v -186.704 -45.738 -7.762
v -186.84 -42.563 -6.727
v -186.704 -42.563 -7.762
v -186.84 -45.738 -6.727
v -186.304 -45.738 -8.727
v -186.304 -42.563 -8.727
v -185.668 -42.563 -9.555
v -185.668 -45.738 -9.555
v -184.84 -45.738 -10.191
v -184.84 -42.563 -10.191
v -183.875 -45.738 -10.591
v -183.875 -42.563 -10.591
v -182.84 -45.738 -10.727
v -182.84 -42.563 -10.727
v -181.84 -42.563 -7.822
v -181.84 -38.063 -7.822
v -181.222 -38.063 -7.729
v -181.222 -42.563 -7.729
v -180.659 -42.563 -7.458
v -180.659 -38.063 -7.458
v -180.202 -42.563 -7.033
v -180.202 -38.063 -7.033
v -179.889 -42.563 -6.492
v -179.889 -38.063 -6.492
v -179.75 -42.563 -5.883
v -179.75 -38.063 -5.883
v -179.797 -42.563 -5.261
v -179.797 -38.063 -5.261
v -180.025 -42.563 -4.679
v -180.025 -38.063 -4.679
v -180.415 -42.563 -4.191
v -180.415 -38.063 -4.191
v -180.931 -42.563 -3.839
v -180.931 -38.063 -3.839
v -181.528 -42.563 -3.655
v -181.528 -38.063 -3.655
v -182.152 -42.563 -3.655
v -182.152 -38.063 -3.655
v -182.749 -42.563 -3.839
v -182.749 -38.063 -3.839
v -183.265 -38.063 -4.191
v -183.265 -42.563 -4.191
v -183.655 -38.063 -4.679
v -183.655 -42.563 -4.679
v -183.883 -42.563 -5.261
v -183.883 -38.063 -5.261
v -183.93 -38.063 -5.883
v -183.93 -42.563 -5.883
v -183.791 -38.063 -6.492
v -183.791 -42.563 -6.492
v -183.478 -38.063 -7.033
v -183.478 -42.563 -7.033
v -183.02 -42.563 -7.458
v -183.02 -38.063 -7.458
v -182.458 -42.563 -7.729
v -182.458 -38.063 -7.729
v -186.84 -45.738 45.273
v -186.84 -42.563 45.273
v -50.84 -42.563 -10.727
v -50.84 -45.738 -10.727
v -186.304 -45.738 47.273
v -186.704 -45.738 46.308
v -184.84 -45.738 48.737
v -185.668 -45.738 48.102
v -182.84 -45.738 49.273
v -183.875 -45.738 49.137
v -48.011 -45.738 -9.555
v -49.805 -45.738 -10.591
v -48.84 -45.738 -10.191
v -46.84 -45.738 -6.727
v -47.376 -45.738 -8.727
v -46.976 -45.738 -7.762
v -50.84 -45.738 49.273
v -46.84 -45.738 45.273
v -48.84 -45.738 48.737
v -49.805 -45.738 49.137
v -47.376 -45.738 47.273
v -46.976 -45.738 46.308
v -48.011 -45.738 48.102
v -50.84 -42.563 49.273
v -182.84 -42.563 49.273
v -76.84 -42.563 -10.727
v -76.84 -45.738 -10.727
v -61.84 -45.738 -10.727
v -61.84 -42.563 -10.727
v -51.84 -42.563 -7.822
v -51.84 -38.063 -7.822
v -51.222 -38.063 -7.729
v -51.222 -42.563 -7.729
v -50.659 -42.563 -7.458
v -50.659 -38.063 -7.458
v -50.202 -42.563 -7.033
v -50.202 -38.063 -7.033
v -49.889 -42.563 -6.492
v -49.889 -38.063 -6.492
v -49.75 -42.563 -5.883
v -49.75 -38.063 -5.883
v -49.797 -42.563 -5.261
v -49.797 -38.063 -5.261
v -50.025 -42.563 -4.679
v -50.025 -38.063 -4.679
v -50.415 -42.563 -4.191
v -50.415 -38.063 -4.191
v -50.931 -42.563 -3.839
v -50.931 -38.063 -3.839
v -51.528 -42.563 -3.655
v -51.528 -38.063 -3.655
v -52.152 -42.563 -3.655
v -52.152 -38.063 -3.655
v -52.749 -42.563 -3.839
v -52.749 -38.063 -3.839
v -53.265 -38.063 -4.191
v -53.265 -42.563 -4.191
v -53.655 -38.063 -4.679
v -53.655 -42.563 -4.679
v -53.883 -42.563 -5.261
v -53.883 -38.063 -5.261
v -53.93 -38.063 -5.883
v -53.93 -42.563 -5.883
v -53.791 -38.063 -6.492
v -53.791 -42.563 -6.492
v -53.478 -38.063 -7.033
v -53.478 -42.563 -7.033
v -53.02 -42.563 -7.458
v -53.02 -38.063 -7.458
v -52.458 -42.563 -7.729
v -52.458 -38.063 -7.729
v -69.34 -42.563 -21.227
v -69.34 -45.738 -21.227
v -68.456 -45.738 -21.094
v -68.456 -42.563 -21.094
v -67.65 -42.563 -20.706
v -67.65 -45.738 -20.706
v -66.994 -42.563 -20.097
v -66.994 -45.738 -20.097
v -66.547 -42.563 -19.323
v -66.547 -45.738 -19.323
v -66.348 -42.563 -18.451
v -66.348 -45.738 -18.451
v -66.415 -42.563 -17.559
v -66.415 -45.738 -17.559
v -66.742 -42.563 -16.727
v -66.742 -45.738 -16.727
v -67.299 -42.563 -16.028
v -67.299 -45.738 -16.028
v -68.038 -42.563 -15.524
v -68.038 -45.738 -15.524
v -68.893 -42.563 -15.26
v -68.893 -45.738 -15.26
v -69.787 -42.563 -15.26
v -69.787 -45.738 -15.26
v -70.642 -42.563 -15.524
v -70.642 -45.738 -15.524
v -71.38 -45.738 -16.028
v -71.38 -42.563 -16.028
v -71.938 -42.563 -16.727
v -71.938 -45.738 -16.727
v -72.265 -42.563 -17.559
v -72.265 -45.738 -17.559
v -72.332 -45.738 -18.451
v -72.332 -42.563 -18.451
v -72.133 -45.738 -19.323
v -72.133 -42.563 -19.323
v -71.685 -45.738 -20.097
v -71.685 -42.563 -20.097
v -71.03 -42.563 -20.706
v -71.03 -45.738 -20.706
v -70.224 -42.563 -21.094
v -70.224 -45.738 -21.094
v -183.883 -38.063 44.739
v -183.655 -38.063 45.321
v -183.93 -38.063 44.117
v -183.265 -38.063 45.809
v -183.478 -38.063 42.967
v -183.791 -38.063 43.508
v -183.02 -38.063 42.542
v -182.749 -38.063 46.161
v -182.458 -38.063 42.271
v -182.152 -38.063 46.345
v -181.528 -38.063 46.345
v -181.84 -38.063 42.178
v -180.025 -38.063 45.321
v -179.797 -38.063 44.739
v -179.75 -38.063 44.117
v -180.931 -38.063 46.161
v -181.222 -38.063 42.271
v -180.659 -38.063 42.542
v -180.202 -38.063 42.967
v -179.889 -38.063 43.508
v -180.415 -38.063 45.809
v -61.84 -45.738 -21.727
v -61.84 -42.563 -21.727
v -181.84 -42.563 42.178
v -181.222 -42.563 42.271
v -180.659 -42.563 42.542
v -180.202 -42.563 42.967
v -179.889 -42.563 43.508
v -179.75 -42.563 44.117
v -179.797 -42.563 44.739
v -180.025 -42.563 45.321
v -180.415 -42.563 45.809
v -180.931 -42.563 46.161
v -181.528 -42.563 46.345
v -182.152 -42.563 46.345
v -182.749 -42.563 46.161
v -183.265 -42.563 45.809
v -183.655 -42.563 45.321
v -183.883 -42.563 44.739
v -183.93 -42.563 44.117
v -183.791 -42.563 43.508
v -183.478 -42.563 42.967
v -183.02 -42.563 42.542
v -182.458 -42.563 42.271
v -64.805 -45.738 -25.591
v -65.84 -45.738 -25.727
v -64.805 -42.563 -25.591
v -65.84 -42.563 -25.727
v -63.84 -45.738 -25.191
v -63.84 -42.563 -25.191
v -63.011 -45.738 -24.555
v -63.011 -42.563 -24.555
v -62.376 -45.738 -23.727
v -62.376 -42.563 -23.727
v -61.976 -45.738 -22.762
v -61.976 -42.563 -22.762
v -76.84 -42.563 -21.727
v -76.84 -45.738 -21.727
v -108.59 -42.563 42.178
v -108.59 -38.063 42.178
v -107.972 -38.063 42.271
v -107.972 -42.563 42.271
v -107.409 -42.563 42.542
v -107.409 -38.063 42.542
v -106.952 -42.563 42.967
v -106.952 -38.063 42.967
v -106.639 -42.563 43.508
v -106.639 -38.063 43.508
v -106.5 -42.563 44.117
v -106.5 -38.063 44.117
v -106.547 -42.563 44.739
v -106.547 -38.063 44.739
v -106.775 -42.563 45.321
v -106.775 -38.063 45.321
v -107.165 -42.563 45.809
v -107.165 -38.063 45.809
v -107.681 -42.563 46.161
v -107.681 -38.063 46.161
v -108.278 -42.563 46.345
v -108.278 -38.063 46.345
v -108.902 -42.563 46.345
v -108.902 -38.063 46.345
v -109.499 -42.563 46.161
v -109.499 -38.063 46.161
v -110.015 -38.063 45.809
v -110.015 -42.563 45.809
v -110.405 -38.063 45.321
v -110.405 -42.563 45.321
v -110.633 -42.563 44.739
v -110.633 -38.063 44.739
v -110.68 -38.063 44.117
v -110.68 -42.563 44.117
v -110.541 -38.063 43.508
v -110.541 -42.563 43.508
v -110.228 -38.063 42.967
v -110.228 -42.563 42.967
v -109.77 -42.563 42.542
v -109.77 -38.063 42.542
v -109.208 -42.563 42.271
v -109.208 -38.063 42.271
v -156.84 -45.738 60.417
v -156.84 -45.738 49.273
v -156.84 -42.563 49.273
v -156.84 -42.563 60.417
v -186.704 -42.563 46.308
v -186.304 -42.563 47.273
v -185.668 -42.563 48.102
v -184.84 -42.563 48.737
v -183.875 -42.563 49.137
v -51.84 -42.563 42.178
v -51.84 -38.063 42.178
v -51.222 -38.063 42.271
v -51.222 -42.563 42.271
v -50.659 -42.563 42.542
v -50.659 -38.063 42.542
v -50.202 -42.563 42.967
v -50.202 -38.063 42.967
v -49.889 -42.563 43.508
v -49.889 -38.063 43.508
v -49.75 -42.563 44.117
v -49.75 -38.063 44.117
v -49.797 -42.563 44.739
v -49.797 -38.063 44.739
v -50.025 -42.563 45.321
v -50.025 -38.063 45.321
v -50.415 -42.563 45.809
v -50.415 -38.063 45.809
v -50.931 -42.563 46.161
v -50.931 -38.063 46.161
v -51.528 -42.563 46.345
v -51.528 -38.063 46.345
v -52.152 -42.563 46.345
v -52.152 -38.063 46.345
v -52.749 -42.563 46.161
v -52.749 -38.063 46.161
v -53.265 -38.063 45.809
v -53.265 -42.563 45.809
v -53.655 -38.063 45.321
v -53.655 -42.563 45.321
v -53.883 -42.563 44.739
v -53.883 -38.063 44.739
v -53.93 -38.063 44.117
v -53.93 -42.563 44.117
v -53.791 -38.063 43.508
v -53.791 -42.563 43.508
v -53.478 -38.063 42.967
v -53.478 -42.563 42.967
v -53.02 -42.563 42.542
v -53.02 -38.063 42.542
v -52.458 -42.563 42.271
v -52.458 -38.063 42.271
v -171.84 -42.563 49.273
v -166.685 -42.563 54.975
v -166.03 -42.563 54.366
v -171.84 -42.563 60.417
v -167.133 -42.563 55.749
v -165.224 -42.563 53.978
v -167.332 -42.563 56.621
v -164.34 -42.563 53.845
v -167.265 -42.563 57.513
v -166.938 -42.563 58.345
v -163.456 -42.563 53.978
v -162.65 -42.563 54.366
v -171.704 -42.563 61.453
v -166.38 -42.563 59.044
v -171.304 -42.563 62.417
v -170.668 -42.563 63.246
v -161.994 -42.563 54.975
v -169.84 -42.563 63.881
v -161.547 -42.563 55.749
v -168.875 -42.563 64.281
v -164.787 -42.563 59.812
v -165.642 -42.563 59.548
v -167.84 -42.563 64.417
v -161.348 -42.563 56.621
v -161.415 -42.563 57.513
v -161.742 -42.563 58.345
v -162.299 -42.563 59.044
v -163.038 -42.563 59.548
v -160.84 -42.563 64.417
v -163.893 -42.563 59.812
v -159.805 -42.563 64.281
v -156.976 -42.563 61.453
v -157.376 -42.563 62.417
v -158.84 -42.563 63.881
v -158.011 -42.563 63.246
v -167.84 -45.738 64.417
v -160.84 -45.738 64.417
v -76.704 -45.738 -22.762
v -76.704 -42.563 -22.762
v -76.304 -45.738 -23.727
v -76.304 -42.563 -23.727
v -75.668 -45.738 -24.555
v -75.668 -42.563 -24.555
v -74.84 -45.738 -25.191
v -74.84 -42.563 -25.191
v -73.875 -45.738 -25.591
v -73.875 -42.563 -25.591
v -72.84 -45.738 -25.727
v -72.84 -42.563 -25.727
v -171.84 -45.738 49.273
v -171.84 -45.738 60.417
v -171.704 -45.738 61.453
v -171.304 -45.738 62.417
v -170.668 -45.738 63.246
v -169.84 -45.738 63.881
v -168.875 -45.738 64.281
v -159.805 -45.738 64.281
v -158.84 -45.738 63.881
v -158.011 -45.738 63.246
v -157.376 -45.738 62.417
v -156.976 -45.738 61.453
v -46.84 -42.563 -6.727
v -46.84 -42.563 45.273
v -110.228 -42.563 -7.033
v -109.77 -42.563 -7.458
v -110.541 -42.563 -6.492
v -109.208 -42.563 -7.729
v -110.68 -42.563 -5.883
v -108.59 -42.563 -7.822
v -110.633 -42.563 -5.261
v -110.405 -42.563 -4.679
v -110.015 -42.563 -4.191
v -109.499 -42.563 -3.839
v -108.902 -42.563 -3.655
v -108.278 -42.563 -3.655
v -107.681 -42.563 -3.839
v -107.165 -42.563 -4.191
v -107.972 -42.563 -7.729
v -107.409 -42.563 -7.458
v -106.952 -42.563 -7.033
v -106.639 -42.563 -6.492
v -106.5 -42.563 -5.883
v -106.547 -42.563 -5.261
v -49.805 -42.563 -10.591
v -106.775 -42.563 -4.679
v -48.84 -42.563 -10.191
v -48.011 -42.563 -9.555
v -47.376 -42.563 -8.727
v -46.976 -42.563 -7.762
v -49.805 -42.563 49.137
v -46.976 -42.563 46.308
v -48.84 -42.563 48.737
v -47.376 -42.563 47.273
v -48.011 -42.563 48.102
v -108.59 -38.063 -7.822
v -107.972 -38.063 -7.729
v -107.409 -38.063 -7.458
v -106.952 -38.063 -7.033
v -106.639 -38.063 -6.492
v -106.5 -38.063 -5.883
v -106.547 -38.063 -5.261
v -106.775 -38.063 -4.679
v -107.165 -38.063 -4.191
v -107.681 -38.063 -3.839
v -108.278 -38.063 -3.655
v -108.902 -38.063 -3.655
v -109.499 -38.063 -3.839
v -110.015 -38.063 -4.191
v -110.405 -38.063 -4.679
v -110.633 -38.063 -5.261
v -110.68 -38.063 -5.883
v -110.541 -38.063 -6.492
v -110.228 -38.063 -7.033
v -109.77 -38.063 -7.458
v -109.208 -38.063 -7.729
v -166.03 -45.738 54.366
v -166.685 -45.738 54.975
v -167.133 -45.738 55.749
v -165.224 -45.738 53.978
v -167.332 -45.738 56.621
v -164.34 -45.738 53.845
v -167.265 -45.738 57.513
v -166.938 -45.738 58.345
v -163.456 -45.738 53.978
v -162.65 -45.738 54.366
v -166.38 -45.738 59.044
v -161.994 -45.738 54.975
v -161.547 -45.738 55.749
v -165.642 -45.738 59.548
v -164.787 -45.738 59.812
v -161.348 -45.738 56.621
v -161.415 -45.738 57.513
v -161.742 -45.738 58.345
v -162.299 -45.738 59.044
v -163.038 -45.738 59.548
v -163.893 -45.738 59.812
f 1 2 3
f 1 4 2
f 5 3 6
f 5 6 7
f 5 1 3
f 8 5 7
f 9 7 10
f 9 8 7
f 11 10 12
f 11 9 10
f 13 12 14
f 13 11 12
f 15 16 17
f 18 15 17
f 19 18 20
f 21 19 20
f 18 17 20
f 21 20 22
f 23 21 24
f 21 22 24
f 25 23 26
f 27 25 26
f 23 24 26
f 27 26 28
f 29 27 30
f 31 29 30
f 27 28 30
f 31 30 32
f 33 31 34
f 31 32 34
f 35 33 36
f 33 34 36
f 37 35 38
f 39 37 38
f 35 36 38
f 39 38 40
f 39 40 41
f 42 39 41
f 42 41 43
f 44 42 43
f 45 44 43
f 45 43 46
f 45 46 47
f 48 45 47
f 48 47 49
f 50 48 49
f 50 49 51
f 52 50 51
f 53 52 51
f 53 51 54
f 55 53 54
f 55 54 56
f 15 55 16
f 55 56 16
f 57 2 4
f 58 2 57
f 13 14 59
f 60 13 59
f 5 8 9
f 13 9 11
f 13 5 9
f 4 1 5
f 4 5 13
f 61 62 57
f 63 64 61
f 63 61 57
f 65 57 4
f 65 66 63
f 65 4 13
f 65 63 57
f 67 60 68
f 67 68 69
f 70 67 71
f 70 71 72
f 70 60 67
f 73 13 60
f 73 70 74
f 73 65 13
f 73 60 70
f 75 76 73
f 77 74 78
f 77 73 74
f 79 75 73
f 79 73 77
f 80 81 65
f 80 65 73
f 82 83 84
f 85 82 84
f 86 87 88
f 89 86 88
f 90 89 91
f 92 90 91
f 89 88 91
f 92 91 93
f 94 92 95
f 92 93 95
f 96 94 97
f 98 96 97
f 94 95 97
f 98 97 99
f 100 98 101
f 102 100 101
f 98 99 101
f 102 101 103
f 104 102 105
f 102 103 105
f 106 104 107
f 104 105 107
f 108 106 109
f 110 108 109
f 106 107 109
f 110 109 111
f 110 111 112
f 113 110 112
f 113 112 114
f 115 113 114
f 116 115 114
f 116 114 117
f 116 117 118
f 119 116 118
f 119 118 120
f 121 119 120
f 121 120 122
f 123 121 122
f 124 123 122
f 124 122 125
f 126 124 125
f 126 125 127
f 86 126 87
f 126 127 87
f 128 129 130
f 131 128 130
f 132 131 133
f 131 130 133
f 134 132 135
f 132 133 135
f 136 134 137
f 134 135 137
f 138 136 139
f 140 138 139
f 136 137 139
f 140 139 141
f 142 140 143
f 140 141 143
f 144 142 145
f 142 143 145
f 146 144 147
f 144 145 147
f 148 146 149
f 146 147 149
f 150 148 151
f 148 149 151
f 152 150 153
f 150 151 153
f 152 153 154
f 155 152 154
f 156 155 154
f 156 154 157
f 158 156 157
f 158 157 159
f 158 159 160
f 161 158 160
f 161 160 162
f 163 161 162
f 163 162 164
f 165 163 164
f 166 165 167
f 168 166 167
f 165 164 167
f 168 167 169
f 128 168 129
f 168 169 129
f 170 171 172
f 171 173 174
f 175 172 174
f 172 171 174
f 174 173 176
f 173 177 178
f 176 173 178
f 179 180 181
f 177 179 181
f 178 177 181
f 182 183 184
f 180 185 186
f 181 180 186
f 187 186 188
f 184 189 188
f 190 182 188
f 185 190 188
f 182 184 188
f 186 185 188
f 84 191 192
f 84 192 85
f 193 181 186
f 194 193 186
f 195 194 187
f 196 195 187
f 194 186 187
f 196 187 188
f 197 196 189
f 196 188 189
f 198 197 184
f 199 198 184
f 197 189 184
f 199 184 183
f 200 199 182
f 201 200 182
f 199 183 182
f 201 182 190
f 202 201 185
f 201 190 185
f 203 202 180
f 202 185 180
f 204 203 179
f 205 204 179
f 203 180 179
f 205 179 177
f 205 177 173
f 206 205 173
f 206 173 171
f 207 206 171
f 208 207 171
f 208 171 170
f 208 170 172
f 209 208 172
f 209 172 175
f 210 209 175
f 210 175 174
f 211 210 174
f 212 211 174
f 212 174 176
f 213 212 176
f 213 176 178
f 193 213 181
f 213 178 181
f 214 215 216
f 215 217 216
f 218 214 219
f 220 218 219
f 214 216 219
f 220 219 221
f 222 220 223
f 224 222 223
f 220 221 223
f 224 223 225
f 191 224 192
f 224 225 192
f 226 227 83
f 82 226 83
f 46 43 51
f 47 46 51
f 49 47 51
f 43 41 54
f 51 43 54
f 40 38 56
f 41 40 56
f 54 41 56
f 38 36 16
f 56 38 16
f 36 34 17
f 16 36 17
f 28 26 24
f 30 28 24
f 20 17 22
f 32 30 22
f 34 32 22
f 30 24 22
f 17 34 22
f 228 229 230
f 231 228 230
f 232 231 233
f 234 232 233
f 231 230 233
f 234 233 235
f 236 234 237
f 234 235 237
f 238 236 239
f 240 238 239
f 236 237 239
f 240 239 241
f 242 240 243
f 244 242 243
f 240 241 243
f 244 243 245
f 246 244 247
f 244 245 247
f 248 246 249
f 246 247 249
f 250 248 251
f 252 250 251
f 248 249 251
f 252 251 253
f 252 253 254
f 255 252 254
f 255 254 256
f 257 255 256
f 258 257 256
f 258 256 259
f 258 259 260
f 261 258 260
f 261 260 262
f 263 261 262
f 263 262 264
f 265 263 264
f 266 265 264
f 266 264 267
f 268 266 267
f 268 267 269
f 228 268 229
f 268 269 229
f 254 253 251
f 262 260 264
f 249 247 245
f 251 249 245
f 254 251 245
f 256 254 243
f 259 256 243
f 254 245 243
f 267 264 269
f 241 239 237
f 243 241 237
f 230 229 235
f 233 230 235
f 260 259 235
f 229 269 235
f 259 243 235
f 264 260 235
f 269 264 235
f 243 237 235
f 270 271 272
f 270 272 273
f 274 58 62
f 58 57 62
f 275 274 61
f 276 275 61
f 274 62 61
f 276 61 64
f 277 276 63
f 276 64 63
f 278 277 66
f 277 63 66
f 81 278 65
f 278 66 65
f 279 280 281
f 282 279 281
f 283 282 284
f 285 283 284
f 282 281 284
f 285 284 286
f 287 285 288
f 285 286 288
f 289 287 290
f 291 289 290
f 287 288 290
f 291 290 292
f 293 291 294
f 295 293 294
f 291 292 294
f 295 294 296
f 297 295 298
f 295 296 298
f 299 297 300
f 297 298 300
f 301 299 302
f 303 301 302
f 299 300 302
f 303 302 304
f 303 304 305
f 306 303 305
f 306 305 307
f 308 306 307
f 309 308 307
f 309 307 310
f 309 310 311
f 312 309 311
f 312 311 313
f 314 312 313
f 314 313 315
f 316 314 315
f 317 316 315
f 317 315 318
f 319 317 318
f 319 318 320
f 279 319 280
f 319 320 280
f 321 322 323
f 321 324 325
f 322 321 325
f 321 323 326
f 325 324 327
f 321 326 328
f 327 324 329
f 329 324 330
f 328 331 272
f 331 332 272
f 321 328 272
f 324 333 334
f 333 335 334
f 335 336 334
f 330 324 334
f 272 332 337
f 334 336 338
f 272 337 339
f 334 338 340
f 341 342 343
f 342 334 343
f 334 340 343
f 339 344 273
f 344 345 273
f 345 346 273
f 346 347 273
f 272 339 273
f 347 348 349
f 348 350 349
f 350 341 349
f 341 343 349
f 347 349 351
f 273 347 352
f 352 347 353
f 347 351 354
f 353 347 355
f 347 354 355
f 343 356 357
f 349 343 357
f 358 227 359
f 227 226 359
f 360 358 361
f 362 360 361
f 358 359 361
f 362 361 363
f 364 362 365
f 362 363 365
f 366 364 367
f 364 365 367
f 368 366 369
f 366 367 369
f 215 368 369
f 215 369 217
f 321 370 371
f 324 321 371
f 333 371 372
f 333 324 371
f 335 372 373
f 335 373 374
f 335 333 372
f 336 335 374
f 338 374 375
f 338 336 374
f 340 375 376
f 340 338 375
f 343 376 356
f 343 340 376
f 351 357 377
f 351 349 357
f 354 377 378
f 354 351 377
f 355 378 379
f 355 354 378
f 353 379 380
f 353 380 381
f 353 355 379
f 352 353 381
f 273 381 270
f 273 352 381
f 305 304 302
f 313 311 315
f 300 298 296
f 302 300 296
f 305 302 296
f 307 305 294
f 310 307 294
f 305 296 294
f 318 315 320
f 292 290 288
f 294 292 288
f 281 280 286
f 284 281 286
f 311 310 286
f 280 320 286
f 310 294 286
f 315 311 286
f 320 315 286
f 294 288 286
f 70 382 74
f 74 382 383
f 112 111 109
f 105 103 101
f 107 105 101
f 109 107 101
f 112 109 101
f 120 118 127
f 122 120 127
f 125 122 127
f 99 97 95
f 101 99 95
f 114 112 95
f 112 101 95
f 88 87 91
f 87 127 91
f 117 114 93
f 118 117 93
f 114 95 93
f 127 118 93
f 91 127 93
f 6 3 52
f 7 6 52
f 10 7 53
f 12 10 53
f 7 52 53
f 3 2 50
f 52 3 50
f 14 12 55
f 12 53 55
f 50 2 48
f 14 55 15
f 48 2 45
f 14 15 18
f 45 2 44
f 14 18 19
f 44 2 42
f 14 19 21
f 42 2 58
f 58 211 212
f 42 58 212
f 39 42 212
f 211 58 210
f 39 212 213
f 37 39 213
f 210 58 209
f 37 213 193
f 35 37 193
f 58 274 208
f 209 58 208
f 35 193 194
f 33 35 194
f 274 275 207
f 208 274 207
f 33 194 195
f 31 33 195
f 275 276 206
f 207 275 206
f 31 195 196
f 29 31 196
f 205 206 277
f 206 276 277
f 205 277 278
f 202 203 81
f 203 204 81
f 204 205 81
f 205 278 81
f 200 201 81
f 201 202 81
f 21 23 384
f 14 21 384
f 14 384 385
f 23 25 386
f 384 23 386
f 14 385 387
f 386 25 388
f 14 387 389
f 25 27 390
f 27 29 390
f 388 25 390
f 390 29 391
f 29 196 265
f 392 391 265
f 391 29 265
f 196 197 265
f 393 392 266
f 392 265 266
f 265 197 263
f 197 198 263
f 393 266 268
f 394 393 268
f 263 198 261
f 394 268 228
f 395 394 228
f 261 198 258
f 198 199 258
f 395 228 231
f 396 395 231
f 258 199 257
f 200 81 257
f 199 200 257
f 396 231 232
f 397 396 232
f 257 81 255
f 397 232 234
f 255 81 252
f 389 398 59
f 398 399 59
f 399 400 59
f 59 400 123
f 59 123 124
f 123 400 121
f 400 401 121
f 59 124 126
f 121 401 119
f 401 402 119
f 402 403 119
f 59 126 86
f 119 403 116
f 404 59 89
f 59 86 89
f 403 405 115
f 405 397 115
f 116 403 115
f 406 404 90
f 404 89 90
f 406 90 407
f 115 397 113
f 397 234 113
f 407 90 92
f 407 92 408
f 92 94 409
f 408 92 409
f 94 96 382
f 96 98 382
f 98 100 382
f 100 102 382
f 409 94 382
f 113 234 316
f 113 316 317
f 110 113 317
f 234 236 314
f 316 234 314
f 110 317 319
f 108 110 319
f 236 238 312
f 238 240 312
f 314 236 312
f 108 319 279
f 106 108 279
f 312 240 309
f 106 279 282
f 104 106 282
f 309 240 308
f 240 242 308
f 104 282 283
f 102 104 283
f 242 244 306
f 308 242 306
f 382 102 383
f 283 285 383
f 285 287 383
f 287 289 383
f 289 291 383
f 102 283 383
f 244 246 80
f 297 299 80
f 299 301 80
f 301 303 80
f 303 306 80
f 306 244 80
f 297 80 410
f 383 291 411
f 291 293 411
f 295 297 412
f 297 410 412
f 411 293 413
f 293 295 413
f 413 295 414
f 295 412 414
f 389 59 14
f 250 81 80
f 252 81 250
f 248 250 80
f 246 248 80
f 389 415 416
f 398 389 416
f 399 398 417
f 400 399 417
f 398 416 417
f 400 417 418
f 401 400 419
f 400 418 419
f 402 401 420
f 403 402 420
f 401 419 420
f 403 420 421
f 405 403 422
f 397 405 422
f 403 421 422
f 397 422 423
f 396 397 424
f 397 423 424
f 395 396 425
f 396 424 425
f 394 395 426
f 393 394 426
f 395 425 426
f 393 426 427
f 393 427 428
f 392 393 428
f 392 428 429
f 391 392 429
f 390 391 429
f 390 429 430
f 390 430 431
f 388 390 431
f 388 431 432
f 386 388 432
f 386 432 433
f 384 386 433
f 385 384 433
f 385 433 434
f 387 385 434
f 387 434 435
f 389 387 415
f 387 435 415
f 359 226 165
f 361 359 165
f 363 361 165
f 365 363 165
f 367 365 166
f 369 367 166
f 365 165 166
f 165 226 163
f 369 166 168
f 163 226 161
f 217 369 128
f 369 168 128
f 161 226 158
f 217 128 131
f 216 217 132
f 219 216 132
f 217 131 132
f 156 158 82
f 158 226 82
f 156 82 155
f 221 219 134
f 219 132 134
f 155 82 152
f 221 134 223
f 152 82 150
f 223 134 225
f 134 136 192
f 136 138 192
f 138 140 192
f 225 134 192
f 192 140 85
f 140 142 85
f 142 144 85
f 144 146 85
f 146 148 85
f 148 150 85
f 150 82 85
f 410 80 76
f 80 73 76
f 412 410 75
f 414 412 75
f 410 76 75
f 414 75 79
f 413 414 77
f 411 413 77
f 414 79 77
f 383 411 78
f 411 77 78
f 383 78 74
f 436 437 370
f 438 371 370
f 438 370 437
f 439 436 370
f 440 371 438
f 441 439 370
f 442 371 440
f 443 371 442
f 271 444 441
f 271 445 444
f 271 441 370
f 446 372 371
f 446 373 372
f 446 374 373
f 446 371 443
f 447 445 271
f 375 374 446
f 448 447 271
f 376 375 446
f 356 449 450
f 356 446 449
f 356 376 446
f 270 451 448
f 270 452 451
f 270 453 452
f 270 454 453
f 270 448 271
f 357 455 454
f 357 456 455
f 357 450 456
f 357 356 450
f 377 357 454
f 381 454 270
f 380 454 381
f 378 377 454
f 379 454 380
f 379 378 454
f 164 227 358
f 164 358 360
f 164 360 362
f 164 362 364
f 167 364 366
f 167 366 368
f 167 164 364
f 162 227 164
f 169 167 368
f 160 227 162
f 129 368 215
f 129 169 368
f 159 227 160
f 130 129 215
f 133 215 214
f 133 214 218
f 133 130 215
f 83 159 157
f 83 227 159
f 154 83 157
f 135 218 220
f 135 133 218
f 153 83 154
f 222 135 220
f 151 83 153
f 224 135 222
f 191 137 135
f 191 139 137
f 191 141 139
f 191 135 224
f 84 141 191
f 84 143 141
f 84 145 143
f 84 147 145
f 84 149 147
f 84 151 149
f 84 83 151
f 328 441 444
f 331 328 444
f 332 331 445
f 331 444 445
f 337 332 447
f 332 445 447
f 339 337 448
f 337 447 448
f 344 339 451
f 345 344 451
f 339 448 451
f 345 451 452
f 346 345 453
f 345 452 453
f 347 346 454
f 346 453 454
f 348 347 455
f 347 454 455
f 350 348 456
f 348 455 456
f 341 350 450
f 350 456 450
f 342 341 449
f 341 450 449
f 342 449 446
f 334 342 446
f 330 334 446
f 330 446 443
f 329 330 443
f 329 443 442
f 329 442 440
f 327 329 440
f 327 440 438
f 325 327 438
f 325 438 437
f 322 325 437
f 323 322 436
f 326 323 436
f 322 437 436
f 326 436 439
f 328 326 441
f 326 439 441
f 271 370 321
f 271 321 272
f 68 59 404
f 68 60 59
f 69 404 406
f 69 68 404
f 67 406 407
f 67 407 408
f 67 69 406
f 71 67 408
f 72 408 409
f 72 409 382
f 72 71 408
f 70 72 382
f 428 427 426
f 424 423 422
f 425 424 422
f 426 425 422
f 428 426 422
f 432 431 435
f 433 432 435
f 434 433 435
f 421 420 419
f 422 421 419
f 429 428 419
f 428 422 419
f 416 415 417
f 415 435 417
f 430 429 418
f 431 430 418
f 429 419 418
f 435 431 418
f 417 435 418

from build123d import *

# Parameters (mm, degrees)
SKETCH1_R             = 2.0955
BOSS_EXTRUDE1_DEPTH   = 4.5
BOSS_EXTRUDE1_2_DEPTH = 4.5
BOSS_EXTRUDE1_3_DEPTH = 4.5
BOSS_EXTRUDE1_4_DEPTH = 4.5
BOSS_EXTRUDE1_5_DEPTH = 4.5
BOSS_EXTRUDE1_6_DEPTH = 4.5
SKETCH2_W             = 140
SKETCH2_H             = 60
BOSS_EXTRUDE2_DEPTH   = 3.175
FILLET1_R             = 4
SKETCH3_W             = 15
SKETCH3_H             = 15.144108324
SKETCH3_R             = 3
BOSS_EXTRUDE3_DEPTH   = 3.175
SKETCH3_H_2           = 15
BOSS_EXTRUDE3_2_DEPTH = 3.175
FILLET2_R             = 4
FILLET3_R             = 4


with BuildPart() as part:
    # Sketch1 → Boss-Extrude1 (new body)
    with BuildSketch(Plane.XZ.offset(38.063324544)):
        with Locations(Location((-181.839905385, -5.726884341, 0), (0, 0, 270))):
            Circle(SKETCH1_R)
    extrude(amount=BOSS_EXTRUDE1_DEPTH)



with BuildPart() as body_2:
    # Sketch1 → Boss-Extrude1 2 (new body)
    with BuildSketch(Plane.XZ.offset(38.063324544)):
        with Locations(Location((-108.589905385, -5.726884341, 0), (0, 0, 270))):
            Circle(SKETCH1_R)
    extrude(amount=BOSS_EXTRUDE1_2_DEPTH)


with BuildPart() as body_3:
    # Sketch1 → Boss-Extrude1 3 (new body)
    with BuildSketch(Plane.XZ.offset(38.063324544)):
        with Locations(Location((-51.839905385, -5.726884341, 0), (0, 0, 270))):
            Circle(SKETCH1_R)
    extrude(amount=BOSS_EXTRUDE1_3_DEPTH)


with BuildPart() as body_4:
    # Sketch1 → Boss-Extrude1 4 (new body)
    with BuildSketch(Plane.XZ.offset(38.063324544)):
        with Locations(Location((-51.839905385, 44.273115659, 0), (0, 0, 270))):
            Circle(SKETCH1_R)
    extrude(amount=BOSS_EXTRUDE1_4_DEPTH)


with BuildPart() as body_5:
    # Sketch1 → Boss-Extrude1 5 (new body)
    with BuildSketch(Plane.XZ.offset(38.063324544)):
        with Locations(Location((-108.589905385, 44.273115659, 0), (0, 0, 270))):
            Circle(SKETCH1_R)
    extrude(amount=BOSS_EXTRUDE1_5_DEPTH)


with BuildPart() as body_6:
    # Sketch1 → Boss-Extrude1 6 (new body)
    with BuildSketch(Plane.XZ.offset(38.063324544)):
        with Locations(Location((-181.839905385, 44.273115659, 0), (0, 0, 270))):
            Circle(SKETCH1_R)
    extrude(amount=BOSS_EXTRUDE1_6_DEPTH)


with BuildPart() as part_1:
    add(part.part)

    add(body_2.part)  # Boss-Extrude2 merges body 2

    add(body_3.part)  # Boss-Extrude2 merges body 3

    add(body_4.part)  # Boss-Extrude2 merges body 4

    add(body_5.part)  # Boss-Extrude2 merges body 5

    add(body_6.part)  # Boss-Extrude2 merges body 6
    # Sketch2 → Boss-Extrude2 (add)
    with BuildSketch(Plane.XZ.offset(42.563324544)):
        with Locations((-116.839905385, 19.273115659)):
            Rectangle(SKETCH2_W, SKETCH2_H)
    extrude(amount=BOSS_EXTRUDE2_DEPTH)

    # Fillet1
    fillet1_edges = [part_1.edges().sort_by_distance(p)[0] for p in [
        (-46.839905385, -44.150824544, -10.726884341),
        (-46.839905385, -44.150824544, 49.273115659),
        (-186.839905385, -44.150824544, 49.273115659),
        (-186.839905385, -44.150824544, -10.726884341),
    ]]
    fillet(fillet1_edges, radius=FILLET1_R)


with BuildPart() as body_2_2:
    # Sketch3 → Boss-Extrude3 (new body)
    with BuildSketch(Plane.XZ.offset(45.738324544)):
        with Locations((-164.339905385, 56.845169821)):
            Rectangle(SKETCH3_W, SKETCH3_H)
        with Locations(Location((-164.339905385, 56.845169821, 0), (0, 0, 270))):
            Circle(SKETCH3_R, mode=Mode.SUBTRACT)
    extrude(amount=-BOSS_EXTRUDE3_DEPTH)

    # Fillet2
    fillet2_edges = [body_2_2.edges().sort_by_distance(p)[0] for p in [
        (-171.839905385, -44.150824544, 64.417223983),
        (-156.839905385, -44.150824544, 64.417223983),
    ]]
    fillet(fillet2_edges, radius=FILLET2_R)


with BuildPart() as body_3_2:
    # Sketch3 → Boss-Extrude3 2 (new body)
    with BuildSketch(Plane.XZ.offset(45.738324544)):
        with Locations((-69.339905385, -18.226884341)):
            Rectangle(SKETCH3_W, SKETCH3_H_2)
        with Locations(Location((-69.339905385, -18.226884341, 0), (0, 0, 270))):
            Circle(SKETCH3_R, mode=Mode.SUBTRACT)
    extrude(amount=-BOSS_EXTRUDE3_2_DEPTH)

    # Fillet3
    fillet3_edges = [body_3_2.edges().sort_by_distance(p)[0] for p in [
        (-76.839905385, -44.150824544, -25.726884341),
        (-61.839905385, -44.150824544, -25.726884341),
    ]]
    fillet(fillet3_edges, radius=FILLET3_R)


solid = Compound([part_1.part, body_2_2.part, body_3_2.part])
